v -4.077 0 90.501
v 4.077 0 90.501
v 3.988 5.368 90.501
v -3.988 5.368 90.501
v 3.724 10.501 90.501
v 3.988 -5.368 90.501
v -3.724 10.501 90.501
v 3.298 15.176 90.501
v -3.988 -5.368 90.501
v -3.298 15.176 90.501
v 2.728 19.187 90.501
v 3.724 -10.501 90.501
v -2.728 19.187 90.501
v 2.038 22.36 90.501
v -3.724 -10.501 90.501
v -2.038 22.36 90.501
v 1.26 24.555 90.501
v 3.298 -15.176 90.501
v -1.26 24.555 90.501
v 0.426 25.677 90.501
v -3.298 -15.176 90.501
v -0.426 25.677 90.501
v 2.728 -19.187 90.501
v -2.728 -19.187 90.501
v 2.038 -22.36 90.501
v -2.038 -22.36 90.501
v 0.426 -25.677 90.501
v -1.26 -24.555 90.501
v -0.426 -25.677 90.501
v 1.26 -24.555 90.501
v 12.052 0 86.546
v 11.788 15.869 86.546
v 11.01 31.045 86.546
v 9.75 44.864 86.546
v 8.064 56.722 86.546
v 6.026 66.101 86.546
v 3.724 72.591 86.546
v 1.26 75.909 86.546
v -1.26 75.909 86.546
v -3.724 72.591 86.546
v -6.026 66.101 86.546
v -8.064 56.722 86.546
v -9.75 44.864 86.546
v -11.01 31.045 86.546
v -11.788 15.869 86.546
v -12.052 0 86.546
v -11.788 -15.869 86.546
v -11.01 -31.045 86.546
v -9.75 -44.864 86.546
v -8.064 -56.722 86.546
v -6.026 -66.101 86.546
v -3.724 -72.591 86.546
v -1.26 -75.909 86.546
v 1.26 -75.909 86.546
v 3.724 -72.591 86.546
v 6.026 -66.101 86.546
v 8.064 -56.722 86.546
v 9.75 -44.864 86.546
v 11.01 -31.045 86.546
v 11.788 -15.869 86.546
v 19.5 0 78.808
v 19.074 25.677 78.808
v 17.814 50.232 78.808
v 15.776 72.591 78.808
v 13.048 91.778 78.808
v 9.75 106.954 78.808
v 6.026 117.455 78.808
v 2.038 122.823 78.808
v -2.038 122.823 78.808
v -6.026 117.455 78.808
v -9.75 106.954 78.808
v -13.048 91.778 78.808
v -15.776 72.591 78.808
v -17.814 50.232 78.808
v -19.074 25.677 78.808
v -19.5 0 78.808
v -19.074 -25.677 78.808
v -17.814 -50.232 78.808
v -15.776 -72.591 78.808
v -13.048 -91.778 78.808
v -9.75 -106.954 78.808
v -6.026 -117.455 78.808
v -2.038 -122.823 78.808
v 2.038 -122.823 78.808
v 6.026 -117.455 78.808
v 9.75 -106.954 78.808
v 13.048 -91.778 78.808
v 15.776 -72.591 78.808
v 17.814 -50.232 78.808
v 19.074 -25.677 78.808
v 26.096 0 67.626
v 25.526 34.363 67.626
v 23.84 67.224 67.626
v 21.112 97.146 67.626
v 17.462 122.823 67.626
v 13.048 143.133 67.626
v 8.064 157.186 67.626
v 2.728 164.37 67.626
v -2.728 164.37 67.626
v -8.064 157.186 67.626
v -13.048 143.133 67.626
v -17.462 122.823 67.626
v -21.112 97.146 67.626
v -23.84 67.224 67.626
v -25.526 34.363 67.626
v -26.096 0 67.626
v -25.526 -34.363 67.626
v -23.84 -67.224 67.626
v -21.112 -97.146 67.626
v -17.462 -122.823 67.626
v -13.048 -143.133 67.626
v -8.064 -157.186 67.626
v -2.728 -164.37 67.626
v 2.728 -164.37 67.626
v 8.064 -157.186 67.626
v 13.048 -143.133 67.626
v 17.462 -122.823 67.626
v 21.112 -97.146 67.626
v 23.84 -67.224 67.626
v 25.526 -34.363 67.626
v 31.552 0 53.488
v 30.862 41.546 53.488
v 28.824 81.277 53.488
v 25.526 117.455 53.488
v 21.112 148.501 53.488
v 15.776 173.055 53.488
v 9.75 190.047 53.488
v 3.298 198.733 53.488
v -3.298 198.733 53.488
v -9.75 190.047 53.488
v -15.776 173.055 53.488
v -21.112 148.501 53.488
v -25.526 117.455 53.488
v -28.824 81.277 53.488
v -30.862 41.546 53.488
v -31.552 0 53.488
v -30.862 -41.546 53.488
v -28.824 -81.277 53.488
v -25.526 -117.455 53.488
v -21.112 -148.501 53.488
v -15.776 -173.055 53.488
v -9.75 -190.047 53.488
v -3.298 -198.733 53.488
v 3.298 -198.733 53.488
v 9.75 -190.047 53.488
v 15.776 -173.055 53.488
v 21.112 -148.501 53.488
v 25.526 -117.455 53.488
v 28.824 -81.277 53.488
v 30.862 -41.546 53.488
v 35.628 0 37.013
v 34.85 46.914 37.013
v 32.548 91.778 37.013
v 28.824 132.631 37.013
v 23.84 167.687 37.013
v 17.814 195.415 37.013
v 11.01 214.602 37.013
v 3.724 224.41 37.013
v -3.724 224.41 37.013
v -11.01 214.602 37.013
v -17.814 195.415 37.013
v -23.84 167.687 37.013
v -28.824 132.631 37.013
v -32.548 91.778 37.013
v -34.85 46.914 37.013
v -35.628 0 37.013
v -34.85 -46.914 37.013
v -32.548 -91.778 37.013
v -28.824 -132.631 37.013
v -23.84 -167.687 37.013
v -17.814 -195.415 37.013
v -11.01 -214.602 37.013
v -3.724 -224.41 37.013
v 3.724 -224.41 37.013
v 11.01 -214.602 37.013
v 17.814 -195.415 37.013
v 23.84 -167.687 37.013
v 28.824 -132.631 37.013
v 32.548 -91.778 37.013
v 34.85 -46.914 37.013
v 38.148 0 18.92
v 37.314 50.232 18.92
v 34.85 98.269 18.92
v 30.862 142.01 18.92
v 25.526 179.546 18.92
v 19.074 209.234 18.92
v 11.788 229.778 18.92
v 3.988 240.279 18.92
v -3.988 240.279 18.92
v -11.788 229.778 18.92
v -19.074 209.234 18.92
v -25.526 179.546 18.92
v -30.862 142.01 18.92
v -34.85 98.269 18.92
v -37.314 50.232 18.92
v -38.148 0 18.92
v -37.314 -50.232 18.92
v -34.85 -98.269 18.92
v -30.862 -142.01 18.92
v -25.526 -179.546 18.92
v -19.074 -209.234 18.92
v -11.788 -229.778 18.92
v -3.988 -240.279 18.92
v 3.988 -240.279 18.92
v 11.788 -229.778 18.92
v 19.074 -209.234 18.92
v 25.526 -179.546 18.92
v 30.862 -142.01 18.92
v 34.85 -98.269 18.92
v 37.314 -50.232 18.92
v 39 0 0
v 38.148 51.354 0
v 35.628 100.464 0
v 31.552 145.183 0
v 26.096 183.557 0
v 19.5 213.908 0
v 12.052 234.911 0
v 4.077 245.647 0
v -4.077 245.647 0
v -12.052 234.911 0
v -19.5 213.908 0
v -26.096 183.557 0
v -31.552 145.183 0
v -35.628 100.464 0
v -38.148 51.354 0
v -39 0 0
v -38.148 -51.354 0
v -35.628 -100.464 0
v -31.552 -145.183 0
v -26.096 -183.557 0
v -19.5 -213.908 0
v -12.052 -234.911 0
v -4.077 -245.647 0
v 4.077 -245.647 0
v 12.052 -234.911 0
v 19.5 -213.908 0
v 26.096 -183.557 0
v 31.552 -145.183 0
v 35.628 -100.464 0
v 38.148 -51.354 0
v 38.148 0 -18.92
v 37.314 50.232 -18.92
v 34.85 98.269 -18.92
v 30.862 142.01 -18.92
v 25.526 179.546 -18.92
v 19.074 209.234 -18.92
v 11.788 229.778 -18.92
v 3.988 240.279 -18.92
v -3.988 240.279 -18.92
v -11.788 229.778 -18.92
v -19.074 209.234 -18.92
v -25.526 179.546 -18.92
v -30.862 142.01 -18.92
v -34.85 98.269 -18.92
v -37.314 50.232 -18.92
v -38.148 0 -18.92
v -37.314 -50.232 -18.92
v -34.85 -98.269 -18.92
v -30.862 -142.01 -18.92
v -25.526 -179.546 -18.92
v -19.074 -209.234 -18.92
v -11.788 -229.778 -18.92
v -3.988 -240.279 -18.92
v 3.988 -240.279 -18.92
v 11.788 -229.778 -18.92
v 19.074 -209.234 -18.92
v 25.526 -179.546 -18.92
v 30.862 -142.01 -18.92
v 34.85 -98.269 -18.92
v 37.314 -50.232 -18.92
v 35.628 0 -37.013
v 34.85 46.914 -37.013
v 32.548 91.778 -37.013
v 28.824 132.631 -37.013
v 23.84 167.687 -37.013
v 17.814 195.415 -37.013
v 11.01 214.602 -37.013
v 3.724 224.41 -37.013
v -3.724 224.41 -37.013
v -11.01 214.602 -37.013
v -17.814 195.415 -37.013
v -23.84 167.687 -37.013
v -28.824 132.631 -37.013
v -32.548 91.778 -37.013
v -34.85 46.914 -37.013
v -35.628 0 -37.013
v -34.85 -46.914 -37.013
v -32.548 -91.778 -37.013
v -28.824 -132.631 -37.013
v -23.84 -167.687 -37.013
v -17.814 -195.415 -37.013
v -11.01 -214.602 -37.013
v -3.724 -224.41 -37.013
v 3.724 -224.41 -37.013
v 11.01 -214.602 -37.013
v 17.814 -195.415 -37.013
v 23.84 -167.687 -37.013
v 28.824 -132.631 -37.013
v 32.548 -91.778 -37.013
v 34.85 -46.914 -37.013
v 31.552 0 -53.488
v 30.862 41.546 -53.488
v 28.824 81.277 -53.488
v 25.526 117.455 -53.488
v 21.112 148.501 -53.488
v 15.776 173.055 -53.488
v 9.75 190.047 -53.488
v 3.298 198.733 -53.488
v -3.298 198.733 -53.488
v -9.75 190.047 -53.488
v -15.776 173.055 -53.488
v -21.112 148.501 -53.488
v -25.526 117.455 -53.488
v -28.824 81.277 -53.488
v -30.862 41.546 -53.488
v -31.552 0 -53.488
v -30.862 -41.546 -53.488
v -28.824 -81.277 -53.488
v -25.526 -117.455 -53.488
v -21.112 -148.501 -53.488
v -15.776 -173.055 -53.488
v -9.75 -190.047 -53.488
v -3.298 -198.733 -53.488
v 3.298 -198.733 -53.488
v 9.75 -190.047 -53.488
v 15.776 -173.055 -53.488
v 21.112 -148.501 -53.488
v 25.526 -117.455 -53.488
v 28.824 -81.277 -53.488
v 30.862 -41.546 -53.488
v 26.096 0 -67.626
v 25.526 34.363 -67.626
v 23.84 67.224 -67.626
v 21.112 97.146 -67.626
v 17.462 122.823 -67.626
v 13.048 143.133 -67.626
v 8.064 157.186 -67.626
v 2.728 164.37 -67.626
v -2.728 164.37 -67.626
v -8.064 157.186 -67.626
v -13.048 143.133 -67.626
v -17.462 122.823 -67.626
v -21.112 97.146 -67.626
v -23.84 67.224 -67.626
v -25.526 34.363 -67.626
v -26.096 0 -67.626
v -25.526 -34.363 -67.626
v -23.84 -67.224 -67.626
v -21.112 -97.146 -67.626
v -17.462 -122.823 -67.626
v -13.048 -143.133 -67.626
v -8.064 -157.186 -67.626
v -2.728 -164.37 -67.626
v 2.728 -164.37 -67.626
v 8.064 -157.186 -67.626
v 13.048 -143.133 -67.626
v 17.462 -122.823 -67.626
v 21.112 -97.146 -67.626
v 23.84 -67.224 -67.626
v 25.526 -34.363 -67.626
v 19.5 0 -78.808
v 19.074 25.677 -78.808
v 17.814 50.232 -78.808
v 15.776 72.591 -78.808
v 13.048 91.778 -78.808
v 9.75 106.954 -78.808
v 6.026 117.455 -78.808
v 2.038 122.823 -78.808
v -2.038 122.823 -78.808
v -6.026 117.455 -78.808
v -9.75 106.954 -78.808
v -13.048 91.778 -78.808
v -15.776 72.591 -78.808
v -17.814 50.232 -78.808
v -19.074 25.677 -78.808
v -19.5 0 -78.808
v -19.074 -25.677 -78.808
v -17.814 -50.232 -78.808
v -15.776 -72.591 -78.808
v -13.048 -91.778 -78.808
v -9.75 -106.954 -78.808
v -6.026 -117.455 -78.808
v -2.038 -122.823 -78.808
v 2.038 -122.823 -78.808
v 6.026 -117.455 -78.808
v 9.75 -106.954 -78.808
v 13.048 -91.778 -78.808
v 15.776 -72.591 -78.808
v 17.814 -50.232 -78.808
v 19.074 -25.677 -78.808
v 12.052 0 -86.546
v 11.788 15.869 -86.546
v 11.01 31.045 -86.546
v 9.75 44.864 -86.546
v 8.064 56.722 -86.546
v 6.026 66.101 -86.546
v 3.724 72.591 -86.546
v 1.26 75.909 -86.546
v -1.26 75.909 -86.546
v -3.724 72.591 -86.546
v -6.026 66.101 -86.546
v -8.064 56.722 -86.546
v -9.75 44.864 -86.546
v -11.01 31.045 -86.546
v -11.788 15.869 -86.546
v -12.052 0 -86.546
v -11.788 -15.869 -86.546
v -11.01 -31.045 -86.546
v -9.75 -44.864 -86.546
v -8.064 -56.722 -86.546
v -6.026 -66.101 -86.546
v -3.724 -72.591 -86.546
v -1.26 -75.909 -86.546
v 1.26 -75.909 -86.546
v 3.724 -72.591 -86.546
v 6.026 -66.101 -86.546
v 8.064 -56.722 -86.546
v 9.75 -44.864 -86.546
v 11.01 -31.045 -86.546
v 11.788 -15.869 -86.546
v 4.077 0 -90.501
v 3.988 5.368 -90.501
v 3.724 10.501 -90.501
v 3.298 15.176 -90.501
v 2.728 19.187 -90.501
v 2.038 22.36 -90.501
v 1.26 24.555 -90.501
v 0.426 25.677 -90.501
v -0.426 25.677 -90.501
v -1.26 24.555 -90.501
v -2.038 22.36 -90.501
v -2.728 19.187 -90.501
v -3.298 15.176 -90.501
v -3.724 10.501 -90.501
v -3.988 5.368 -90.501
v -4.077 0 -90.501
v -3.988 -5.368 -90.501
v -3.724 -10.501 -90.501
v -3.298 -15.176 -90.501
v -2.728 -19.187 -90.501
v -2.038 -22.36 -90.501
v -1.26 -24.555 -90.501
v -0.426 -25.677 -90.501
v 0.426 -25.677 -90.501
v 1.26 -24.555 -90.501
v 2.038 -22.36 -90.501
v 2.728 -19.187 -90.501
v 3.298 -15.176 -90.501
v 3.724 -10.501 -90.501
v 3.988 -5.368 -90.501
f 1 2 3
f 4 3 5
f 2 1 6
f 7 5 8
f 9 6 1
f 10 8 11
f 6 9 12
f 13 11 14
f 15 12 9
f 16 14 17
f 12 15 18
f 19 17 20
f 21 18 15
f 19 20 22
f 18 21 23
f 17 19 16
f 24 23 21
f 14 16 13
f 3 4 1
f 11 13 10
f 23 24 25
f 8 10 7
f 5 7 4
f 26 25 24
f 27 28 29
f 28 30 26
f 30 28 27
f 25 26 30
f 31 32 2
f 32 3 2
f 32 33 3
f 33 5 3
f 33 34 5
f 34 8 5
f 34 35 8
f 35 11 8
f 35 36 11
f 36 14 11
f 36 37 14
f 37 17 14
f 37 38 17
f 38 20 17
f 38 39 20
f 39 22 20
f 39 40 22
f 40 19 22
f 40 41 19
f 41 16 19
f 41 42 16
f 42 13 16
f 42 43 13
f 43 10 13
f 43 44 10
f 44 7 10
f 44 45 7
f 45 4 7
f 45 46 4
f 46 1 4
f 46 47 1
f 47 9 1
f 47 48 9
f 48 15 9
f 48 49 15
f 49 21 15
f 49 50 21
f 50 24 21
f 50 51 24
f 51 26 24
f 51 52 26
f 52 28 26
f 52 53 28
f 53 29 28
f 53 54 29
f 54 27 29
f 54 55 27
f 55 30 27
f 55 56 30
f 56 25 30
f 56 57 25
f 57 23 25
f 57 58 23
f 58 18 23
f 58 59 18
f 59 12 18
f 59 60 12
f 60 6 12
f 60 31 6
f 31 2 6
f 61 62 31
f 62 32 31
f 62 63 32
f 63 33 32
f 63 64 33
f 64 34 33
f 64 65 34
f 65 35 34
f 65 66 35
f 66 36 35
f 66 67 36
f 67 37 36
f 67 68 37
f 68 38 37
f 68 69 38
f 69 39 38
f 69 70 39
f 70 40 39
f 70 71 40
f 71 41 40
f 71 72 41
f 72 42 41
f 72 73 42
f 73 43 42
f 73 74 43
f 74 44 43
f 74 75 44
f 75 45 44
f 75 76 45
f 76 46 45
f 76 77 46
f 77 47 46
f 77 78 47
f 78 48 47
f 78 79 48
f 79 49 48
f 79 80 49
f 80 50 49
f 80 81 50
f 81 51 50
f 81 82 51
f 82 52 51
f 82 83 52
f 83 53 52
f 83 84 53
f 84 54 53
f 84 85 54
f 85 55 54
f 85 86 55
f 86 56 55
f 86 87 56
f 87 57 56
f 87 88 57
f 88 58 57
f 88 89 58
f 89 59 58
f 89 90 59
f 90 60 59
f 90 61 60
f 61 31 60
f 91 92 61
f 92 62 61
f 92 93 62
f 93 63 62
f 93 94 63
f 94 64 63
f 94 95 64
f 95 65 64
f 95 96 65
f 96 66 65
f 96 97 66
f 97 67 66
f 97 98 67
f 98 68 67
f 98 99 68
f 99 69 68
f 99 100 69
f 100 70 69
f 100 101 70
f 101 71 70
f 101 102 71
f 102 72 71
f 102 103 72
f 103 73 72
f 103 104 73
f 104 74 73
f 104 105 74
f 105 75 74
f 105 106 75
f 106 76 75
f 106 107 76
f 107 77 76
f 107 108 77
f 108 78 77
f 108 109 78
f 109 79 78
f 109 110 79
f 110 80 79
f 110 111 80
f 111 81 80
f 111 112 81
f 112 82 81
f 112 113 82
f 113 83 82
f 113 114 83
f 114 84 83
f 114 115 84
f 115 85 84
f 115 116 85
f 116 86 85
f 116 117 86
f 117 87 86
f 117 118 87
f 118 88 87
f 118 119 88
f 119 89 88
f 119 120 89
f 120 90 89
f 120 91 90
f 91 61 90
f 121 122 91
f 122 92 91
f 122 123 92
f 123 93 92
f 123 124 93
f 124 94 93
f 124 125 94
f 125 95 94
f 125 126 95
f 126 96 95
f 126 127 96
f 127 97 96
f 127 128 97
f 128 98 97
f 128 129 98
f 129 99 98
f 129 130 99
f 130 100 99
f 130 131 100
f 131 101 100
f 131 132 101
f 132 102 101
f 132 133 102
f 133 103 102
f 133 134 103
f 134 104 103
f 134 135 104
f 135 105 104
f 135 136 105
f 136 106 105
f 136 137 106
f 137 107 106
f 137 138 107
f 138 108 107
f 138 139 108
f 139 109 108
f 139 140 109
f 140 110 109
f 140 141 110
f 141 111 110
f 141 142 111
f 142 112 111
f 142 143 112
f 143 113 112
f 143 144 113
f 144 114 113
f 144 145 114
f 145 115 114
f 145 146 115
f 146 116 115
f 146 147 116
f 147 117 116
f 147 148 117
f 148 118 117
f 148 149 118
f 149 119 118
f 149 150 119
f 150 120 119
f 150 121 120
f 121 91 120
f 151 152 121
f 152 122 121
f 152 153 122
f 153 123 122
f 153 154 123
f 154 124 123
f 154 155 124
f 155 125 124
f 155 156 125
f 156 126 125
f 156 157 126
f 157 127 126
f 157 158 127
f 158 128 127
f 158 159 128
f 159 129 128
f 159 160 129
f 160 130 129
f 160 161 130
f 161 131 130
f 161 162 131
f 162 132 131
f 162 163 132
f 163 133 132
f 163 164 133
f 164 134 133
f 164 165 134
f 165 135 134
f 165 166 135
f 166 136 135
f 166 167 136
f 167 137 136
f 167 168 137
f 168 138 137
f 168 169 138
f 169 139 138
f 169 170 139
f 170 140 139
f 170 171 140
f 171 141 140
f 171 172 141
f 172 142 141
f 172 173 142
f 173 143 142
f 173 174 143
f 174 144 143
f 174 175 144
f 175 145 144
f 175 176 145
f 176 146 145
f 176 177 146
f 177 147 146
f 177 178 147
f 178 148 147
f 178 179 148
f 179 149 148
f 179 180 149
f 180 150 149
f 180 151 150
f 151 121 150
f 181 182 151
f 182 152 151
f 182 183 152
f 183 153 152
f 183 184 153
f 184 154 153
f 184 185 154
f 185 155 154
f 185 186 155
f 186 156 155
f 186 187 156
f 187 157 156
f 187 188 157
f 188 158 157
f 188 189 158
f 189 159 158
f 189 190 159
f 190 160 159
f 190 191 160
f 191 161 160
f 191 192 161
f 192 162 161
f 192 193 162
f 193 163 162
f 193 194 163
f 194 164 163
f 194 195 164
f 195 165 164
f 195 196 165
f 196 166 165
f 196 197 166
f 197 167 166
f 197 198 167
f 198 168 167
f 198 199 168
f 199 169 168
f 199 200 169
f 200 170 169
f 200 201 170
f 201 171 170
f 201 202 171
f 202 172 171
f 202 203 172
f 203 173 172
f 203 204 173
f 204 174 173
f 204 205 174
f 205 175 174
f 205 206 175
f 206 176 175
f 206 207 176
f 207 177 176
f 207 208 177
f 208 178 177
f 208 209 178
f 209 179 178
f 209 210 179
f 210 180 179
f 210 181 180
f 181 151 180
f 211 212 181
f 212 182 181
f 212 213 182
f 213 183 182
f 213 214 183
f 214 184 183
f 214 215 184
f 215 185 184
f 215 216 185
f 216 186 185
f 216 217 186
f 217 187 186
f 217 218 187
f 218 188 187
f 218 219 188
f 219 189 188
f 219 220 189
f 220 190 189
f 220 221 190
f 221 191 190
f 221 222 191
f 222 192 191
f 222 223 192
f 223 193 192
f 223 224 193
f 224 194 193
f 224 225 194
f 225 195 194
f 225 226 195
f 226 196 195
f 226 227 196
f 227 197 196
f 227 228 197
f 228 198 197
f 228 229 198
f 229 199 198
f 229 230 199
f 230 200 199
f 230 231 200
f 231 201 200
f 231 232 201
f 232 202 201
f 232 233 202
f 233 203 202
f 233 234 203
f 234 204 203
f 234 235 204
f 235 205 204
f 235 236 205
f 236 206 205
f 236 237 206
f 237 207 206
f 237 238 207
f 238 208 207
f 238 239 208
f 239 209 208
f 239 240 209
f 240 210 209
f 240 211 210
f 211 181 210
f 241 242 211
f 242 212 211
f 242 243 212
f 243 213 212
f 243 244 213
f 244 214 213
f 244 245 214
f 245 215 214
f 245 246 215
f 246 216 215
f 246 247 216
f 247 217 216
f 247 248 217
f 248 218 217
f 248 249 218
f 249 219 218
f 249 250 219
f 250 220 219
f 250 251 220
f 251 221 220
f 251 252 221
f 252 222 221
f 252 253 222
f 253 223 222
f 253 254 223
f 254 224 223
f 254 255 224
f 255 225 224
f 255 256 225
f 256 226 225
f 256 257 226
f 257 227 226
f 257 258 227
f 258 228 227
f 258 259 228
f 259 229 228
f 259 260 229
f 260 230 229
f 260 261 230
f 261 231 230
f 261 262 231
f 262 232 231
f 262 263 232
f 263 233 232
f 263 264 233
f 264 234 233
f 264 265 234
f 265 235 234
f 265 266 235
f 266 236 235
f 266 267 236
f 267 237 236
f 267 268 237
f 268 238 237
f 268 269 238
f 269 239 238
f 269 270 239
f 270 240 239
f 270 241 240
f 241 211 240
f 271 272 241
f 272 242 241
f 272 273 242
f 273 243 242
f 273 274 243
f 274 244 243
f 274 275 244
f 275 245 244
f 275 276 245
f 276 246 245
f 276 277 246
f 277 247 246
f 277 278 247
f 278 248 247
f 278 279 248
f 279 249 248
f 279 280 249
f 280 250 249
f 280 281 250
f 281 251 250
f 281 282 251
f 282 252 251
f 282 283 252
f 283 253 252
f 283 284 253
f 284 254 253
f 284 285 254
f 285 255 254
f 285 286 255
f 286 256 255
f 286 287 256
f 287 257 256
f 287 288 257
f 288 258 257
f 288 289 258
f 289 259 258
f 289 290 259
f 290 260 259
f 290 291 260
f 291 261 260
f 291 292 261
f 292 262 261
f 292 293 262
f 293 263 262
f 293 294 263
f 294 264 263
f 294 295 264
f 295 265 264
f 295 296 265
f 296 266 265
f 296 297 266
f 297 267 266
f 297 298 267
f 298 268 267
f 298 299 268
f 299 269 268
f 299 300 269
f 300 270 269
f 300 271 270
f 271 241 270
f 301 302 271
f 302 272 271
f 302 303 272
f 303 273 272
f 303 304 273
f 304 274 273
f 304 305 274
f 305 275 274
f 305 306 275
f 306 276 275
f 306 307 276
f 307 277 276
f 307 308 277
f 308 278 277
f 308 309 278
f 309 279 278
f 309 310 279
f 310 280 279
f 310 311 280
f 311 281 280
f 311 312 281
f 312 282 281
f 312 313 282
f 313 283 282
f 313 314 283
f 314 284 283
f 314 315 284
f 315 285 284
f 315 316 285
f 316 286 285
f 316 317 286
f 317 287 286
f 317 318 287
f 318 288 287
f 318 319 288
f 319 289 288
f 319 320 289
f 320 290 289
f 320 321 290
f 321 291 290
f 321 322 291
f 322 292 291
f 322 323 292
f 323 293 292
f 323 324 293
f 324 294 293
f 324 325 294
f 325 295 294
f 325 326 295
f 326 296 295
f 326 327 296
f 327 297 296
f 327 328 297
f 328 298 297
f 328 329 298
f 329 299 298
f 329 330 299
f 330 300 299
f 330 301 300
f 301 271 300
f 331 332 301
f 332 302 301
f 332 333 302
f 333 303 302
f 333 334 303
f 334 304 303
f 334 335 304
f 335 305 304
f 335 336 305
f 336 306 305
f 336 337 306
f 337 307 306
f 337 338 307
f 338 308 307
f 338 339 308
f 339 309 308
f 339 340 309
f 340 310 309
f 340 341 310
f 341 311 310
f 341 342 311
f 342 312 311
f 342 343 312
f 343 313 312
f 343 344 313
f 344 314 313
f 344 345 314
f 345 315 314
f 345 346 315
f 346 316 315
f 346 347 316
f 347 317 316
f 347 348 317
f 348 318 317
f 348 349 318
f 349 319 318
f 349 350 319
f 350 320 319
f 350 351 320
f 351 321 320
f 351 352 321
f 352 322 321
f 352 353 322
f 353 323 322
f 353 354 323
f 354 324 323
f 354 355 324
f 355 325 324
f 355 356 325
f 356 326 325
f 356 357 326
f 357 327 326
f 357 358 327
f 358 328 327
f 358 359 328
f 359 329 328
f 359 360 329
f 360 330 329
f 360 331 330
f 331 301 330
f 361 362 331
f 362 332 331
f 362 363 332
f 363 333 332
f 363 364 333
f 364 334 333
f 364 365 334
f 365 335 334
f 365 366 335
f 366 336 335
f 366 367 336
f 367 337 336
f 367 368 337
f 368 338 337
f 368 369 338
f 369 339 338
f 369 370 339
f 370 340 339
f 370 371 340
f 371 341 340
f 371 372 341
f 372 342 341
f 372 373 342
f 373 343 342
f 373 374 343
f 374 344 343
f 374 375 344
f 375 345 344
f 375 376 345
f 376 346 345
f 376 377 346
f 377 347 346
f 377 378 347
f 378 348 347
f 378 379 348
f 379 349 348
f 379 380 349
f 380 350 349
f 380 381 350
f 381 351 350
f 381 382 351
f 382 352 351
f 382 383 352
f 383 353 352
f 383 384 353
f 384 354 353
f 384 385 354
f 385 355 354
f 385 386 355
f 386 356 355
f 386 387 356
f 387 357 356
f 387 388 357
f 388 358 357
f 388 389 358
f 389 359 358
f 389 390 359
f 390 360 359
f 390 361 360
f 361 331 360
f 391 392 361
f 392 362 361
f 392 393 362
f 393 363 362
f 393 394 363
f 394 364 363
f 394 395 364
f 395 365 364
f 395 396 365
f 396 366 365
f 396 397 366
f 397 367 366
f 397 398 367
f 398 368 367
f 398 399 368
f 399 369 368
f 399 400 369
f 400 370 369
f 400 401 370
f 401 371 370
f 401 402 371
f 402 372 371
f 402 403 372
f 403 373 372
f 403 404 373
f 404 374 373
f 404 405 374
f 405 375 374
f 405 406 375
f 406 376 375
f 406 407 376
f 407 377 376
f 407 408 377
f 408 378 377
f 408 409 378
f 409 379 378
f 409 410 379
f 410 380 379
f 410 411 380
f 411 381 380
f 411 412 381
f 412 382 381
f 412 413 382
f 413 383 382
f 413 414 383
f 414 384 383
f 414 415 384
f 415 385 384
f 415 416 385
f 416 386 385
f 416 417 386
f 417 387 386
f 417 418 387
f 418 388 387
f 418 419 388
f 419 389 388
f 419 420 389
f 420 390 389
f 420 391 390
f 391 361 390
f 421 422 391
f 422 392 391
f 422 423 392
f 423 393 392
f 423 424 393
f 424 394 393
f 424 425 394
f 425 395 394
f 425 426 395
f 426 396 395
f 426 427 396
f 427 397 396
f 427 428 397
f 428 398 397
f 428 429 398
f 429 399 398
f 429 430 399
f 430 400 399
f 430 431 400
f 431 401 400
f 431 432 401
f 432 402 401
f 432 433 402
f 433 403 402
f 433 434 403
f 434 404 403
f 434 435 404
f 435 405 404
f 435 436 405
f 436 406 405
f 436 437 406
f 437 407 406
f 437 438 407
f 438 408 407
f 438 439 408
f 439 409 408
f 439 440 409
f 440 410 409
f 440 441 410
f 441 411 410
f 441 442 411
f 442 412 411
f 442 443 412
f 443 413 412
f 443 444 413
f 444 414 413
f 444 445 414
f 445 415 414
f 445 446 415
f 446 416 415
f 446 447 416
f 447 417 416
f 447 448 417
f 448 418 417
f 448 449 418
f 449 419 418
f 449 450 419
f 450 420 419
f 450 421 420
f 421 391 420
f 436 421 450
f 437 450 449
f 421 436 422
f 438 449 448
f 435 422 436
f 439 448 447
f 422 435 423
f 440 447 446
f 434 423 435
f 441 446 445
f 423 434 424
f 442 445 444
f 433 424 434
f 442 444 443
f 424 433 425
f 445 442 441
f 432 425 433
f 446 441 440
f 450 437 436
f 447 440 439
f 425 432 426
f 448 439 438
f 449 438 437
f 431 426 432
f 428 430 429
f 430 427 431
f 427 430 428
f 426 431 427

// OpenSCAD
// Generated by SolidPython 1.0.1 on 2020-07-29 00:46:46


scale(v = [3, 19, 7]) {
	sphere(r = 13);
}
/***********************************************
*********      SolidPython code:      **********
************************************************
 
# import packages: SolidPython
from solid import *
from solid.utils import *
from itertools import chain, combinations, permutations


class Resize:

    def __init__(self, scad_file):
        self.scad_file = scad_file
        #self.scad_file = import_scad(scad_file)
        # cone/cylinder param:
        self.r1 = 0
        self.r2 = 0
        self.h = 0
        # rectangular prism param:
        self.w = 0
        self.l = 0
        # ellipse param:
        self.r = 0

    # import OpenScad code (file name corresponds to shape)


    # classify shape + parameters
    def assign(self, param1, param2, param3):
        if self.scad_file == 'cone.scad':
            self.r1 = param1
            self.r2 = param2
            self.h = param3
        elif self.scad_file == 'cylinder.scad':
            self.r1 = param1
            self.r2 = param2
            self.h = param3
        elif self.scad_file == 'rectangularPrism.scad':
            self.h = param1
            self.l = param2
            self.w = param3
        else:
            self.r = param1
            self.h = param2

    # resize parameters
    def iterate(self):
        x = range(3, 20, 2)
        i = 1
        if self.scad_file == 'cone.scad':
            tempList = list(permutations(x, 2))
            for temp in tempList:
                param1 = temp[0]
                param2 = temp[1]
                filepath = 'produced_scad_files/' + 'cone' + str(param1) + '_' + str(param2) + '_' + '.scad'
                scad_render_to_file(cylinder(h=param1, r1=param2, r2=0), filepath)

        elif self.scad_file == 'cylinder.scad':
            tempList = list(permutations(x, 3))
            for temp in tempList:
                param1 = temp[0]
                param2 = temp[1]
                filepath = 'produced_scad_files/' + 'cylinder' + str(param1) + '_' + str(param2) + '_' + '.scad'
                scad_render_to_file(cylinder(h=param1, r1=param2, r2=param2), filepath)

        elif self.scad_file == 'rectangularPrism.scad':
            tempList = list(permutations(x, 3))
            for temp in tempList:
                param1 = temp[0]
                param2 = temp[1]
                param3 = temp[2]
                filepath = 'produced_scad_files/' + 'rectangularPrism' + str(param1) + '_' + str(param2) + '_' + str(
                    param3) + '.scad'
                scad_render_to_file(cube(size=(param1, param2, param3)), filepath)

        elif self.scad_file == 'ellipse.scad':
            tempList = list(permutations(x, 4))
            for temp in tempList:
                param1 = temp[0]
                param2 = temp[1]
                param3 = temp[2]
                param4 = temp[3]
                filepath = 'produced_scad_files/' + 'ellipse' + str(param1) + '_' + str(param2) + '_' + str(param3) + '_' + str(param4) + '.scad'
                scad_render_to_file(scale([param1, param2, param3])(sphere(r=param4)), filepath)

    def render_to_scadfile(self):
        scad_render_to_file(scad, 'example.scad') 
 
************************************************/
